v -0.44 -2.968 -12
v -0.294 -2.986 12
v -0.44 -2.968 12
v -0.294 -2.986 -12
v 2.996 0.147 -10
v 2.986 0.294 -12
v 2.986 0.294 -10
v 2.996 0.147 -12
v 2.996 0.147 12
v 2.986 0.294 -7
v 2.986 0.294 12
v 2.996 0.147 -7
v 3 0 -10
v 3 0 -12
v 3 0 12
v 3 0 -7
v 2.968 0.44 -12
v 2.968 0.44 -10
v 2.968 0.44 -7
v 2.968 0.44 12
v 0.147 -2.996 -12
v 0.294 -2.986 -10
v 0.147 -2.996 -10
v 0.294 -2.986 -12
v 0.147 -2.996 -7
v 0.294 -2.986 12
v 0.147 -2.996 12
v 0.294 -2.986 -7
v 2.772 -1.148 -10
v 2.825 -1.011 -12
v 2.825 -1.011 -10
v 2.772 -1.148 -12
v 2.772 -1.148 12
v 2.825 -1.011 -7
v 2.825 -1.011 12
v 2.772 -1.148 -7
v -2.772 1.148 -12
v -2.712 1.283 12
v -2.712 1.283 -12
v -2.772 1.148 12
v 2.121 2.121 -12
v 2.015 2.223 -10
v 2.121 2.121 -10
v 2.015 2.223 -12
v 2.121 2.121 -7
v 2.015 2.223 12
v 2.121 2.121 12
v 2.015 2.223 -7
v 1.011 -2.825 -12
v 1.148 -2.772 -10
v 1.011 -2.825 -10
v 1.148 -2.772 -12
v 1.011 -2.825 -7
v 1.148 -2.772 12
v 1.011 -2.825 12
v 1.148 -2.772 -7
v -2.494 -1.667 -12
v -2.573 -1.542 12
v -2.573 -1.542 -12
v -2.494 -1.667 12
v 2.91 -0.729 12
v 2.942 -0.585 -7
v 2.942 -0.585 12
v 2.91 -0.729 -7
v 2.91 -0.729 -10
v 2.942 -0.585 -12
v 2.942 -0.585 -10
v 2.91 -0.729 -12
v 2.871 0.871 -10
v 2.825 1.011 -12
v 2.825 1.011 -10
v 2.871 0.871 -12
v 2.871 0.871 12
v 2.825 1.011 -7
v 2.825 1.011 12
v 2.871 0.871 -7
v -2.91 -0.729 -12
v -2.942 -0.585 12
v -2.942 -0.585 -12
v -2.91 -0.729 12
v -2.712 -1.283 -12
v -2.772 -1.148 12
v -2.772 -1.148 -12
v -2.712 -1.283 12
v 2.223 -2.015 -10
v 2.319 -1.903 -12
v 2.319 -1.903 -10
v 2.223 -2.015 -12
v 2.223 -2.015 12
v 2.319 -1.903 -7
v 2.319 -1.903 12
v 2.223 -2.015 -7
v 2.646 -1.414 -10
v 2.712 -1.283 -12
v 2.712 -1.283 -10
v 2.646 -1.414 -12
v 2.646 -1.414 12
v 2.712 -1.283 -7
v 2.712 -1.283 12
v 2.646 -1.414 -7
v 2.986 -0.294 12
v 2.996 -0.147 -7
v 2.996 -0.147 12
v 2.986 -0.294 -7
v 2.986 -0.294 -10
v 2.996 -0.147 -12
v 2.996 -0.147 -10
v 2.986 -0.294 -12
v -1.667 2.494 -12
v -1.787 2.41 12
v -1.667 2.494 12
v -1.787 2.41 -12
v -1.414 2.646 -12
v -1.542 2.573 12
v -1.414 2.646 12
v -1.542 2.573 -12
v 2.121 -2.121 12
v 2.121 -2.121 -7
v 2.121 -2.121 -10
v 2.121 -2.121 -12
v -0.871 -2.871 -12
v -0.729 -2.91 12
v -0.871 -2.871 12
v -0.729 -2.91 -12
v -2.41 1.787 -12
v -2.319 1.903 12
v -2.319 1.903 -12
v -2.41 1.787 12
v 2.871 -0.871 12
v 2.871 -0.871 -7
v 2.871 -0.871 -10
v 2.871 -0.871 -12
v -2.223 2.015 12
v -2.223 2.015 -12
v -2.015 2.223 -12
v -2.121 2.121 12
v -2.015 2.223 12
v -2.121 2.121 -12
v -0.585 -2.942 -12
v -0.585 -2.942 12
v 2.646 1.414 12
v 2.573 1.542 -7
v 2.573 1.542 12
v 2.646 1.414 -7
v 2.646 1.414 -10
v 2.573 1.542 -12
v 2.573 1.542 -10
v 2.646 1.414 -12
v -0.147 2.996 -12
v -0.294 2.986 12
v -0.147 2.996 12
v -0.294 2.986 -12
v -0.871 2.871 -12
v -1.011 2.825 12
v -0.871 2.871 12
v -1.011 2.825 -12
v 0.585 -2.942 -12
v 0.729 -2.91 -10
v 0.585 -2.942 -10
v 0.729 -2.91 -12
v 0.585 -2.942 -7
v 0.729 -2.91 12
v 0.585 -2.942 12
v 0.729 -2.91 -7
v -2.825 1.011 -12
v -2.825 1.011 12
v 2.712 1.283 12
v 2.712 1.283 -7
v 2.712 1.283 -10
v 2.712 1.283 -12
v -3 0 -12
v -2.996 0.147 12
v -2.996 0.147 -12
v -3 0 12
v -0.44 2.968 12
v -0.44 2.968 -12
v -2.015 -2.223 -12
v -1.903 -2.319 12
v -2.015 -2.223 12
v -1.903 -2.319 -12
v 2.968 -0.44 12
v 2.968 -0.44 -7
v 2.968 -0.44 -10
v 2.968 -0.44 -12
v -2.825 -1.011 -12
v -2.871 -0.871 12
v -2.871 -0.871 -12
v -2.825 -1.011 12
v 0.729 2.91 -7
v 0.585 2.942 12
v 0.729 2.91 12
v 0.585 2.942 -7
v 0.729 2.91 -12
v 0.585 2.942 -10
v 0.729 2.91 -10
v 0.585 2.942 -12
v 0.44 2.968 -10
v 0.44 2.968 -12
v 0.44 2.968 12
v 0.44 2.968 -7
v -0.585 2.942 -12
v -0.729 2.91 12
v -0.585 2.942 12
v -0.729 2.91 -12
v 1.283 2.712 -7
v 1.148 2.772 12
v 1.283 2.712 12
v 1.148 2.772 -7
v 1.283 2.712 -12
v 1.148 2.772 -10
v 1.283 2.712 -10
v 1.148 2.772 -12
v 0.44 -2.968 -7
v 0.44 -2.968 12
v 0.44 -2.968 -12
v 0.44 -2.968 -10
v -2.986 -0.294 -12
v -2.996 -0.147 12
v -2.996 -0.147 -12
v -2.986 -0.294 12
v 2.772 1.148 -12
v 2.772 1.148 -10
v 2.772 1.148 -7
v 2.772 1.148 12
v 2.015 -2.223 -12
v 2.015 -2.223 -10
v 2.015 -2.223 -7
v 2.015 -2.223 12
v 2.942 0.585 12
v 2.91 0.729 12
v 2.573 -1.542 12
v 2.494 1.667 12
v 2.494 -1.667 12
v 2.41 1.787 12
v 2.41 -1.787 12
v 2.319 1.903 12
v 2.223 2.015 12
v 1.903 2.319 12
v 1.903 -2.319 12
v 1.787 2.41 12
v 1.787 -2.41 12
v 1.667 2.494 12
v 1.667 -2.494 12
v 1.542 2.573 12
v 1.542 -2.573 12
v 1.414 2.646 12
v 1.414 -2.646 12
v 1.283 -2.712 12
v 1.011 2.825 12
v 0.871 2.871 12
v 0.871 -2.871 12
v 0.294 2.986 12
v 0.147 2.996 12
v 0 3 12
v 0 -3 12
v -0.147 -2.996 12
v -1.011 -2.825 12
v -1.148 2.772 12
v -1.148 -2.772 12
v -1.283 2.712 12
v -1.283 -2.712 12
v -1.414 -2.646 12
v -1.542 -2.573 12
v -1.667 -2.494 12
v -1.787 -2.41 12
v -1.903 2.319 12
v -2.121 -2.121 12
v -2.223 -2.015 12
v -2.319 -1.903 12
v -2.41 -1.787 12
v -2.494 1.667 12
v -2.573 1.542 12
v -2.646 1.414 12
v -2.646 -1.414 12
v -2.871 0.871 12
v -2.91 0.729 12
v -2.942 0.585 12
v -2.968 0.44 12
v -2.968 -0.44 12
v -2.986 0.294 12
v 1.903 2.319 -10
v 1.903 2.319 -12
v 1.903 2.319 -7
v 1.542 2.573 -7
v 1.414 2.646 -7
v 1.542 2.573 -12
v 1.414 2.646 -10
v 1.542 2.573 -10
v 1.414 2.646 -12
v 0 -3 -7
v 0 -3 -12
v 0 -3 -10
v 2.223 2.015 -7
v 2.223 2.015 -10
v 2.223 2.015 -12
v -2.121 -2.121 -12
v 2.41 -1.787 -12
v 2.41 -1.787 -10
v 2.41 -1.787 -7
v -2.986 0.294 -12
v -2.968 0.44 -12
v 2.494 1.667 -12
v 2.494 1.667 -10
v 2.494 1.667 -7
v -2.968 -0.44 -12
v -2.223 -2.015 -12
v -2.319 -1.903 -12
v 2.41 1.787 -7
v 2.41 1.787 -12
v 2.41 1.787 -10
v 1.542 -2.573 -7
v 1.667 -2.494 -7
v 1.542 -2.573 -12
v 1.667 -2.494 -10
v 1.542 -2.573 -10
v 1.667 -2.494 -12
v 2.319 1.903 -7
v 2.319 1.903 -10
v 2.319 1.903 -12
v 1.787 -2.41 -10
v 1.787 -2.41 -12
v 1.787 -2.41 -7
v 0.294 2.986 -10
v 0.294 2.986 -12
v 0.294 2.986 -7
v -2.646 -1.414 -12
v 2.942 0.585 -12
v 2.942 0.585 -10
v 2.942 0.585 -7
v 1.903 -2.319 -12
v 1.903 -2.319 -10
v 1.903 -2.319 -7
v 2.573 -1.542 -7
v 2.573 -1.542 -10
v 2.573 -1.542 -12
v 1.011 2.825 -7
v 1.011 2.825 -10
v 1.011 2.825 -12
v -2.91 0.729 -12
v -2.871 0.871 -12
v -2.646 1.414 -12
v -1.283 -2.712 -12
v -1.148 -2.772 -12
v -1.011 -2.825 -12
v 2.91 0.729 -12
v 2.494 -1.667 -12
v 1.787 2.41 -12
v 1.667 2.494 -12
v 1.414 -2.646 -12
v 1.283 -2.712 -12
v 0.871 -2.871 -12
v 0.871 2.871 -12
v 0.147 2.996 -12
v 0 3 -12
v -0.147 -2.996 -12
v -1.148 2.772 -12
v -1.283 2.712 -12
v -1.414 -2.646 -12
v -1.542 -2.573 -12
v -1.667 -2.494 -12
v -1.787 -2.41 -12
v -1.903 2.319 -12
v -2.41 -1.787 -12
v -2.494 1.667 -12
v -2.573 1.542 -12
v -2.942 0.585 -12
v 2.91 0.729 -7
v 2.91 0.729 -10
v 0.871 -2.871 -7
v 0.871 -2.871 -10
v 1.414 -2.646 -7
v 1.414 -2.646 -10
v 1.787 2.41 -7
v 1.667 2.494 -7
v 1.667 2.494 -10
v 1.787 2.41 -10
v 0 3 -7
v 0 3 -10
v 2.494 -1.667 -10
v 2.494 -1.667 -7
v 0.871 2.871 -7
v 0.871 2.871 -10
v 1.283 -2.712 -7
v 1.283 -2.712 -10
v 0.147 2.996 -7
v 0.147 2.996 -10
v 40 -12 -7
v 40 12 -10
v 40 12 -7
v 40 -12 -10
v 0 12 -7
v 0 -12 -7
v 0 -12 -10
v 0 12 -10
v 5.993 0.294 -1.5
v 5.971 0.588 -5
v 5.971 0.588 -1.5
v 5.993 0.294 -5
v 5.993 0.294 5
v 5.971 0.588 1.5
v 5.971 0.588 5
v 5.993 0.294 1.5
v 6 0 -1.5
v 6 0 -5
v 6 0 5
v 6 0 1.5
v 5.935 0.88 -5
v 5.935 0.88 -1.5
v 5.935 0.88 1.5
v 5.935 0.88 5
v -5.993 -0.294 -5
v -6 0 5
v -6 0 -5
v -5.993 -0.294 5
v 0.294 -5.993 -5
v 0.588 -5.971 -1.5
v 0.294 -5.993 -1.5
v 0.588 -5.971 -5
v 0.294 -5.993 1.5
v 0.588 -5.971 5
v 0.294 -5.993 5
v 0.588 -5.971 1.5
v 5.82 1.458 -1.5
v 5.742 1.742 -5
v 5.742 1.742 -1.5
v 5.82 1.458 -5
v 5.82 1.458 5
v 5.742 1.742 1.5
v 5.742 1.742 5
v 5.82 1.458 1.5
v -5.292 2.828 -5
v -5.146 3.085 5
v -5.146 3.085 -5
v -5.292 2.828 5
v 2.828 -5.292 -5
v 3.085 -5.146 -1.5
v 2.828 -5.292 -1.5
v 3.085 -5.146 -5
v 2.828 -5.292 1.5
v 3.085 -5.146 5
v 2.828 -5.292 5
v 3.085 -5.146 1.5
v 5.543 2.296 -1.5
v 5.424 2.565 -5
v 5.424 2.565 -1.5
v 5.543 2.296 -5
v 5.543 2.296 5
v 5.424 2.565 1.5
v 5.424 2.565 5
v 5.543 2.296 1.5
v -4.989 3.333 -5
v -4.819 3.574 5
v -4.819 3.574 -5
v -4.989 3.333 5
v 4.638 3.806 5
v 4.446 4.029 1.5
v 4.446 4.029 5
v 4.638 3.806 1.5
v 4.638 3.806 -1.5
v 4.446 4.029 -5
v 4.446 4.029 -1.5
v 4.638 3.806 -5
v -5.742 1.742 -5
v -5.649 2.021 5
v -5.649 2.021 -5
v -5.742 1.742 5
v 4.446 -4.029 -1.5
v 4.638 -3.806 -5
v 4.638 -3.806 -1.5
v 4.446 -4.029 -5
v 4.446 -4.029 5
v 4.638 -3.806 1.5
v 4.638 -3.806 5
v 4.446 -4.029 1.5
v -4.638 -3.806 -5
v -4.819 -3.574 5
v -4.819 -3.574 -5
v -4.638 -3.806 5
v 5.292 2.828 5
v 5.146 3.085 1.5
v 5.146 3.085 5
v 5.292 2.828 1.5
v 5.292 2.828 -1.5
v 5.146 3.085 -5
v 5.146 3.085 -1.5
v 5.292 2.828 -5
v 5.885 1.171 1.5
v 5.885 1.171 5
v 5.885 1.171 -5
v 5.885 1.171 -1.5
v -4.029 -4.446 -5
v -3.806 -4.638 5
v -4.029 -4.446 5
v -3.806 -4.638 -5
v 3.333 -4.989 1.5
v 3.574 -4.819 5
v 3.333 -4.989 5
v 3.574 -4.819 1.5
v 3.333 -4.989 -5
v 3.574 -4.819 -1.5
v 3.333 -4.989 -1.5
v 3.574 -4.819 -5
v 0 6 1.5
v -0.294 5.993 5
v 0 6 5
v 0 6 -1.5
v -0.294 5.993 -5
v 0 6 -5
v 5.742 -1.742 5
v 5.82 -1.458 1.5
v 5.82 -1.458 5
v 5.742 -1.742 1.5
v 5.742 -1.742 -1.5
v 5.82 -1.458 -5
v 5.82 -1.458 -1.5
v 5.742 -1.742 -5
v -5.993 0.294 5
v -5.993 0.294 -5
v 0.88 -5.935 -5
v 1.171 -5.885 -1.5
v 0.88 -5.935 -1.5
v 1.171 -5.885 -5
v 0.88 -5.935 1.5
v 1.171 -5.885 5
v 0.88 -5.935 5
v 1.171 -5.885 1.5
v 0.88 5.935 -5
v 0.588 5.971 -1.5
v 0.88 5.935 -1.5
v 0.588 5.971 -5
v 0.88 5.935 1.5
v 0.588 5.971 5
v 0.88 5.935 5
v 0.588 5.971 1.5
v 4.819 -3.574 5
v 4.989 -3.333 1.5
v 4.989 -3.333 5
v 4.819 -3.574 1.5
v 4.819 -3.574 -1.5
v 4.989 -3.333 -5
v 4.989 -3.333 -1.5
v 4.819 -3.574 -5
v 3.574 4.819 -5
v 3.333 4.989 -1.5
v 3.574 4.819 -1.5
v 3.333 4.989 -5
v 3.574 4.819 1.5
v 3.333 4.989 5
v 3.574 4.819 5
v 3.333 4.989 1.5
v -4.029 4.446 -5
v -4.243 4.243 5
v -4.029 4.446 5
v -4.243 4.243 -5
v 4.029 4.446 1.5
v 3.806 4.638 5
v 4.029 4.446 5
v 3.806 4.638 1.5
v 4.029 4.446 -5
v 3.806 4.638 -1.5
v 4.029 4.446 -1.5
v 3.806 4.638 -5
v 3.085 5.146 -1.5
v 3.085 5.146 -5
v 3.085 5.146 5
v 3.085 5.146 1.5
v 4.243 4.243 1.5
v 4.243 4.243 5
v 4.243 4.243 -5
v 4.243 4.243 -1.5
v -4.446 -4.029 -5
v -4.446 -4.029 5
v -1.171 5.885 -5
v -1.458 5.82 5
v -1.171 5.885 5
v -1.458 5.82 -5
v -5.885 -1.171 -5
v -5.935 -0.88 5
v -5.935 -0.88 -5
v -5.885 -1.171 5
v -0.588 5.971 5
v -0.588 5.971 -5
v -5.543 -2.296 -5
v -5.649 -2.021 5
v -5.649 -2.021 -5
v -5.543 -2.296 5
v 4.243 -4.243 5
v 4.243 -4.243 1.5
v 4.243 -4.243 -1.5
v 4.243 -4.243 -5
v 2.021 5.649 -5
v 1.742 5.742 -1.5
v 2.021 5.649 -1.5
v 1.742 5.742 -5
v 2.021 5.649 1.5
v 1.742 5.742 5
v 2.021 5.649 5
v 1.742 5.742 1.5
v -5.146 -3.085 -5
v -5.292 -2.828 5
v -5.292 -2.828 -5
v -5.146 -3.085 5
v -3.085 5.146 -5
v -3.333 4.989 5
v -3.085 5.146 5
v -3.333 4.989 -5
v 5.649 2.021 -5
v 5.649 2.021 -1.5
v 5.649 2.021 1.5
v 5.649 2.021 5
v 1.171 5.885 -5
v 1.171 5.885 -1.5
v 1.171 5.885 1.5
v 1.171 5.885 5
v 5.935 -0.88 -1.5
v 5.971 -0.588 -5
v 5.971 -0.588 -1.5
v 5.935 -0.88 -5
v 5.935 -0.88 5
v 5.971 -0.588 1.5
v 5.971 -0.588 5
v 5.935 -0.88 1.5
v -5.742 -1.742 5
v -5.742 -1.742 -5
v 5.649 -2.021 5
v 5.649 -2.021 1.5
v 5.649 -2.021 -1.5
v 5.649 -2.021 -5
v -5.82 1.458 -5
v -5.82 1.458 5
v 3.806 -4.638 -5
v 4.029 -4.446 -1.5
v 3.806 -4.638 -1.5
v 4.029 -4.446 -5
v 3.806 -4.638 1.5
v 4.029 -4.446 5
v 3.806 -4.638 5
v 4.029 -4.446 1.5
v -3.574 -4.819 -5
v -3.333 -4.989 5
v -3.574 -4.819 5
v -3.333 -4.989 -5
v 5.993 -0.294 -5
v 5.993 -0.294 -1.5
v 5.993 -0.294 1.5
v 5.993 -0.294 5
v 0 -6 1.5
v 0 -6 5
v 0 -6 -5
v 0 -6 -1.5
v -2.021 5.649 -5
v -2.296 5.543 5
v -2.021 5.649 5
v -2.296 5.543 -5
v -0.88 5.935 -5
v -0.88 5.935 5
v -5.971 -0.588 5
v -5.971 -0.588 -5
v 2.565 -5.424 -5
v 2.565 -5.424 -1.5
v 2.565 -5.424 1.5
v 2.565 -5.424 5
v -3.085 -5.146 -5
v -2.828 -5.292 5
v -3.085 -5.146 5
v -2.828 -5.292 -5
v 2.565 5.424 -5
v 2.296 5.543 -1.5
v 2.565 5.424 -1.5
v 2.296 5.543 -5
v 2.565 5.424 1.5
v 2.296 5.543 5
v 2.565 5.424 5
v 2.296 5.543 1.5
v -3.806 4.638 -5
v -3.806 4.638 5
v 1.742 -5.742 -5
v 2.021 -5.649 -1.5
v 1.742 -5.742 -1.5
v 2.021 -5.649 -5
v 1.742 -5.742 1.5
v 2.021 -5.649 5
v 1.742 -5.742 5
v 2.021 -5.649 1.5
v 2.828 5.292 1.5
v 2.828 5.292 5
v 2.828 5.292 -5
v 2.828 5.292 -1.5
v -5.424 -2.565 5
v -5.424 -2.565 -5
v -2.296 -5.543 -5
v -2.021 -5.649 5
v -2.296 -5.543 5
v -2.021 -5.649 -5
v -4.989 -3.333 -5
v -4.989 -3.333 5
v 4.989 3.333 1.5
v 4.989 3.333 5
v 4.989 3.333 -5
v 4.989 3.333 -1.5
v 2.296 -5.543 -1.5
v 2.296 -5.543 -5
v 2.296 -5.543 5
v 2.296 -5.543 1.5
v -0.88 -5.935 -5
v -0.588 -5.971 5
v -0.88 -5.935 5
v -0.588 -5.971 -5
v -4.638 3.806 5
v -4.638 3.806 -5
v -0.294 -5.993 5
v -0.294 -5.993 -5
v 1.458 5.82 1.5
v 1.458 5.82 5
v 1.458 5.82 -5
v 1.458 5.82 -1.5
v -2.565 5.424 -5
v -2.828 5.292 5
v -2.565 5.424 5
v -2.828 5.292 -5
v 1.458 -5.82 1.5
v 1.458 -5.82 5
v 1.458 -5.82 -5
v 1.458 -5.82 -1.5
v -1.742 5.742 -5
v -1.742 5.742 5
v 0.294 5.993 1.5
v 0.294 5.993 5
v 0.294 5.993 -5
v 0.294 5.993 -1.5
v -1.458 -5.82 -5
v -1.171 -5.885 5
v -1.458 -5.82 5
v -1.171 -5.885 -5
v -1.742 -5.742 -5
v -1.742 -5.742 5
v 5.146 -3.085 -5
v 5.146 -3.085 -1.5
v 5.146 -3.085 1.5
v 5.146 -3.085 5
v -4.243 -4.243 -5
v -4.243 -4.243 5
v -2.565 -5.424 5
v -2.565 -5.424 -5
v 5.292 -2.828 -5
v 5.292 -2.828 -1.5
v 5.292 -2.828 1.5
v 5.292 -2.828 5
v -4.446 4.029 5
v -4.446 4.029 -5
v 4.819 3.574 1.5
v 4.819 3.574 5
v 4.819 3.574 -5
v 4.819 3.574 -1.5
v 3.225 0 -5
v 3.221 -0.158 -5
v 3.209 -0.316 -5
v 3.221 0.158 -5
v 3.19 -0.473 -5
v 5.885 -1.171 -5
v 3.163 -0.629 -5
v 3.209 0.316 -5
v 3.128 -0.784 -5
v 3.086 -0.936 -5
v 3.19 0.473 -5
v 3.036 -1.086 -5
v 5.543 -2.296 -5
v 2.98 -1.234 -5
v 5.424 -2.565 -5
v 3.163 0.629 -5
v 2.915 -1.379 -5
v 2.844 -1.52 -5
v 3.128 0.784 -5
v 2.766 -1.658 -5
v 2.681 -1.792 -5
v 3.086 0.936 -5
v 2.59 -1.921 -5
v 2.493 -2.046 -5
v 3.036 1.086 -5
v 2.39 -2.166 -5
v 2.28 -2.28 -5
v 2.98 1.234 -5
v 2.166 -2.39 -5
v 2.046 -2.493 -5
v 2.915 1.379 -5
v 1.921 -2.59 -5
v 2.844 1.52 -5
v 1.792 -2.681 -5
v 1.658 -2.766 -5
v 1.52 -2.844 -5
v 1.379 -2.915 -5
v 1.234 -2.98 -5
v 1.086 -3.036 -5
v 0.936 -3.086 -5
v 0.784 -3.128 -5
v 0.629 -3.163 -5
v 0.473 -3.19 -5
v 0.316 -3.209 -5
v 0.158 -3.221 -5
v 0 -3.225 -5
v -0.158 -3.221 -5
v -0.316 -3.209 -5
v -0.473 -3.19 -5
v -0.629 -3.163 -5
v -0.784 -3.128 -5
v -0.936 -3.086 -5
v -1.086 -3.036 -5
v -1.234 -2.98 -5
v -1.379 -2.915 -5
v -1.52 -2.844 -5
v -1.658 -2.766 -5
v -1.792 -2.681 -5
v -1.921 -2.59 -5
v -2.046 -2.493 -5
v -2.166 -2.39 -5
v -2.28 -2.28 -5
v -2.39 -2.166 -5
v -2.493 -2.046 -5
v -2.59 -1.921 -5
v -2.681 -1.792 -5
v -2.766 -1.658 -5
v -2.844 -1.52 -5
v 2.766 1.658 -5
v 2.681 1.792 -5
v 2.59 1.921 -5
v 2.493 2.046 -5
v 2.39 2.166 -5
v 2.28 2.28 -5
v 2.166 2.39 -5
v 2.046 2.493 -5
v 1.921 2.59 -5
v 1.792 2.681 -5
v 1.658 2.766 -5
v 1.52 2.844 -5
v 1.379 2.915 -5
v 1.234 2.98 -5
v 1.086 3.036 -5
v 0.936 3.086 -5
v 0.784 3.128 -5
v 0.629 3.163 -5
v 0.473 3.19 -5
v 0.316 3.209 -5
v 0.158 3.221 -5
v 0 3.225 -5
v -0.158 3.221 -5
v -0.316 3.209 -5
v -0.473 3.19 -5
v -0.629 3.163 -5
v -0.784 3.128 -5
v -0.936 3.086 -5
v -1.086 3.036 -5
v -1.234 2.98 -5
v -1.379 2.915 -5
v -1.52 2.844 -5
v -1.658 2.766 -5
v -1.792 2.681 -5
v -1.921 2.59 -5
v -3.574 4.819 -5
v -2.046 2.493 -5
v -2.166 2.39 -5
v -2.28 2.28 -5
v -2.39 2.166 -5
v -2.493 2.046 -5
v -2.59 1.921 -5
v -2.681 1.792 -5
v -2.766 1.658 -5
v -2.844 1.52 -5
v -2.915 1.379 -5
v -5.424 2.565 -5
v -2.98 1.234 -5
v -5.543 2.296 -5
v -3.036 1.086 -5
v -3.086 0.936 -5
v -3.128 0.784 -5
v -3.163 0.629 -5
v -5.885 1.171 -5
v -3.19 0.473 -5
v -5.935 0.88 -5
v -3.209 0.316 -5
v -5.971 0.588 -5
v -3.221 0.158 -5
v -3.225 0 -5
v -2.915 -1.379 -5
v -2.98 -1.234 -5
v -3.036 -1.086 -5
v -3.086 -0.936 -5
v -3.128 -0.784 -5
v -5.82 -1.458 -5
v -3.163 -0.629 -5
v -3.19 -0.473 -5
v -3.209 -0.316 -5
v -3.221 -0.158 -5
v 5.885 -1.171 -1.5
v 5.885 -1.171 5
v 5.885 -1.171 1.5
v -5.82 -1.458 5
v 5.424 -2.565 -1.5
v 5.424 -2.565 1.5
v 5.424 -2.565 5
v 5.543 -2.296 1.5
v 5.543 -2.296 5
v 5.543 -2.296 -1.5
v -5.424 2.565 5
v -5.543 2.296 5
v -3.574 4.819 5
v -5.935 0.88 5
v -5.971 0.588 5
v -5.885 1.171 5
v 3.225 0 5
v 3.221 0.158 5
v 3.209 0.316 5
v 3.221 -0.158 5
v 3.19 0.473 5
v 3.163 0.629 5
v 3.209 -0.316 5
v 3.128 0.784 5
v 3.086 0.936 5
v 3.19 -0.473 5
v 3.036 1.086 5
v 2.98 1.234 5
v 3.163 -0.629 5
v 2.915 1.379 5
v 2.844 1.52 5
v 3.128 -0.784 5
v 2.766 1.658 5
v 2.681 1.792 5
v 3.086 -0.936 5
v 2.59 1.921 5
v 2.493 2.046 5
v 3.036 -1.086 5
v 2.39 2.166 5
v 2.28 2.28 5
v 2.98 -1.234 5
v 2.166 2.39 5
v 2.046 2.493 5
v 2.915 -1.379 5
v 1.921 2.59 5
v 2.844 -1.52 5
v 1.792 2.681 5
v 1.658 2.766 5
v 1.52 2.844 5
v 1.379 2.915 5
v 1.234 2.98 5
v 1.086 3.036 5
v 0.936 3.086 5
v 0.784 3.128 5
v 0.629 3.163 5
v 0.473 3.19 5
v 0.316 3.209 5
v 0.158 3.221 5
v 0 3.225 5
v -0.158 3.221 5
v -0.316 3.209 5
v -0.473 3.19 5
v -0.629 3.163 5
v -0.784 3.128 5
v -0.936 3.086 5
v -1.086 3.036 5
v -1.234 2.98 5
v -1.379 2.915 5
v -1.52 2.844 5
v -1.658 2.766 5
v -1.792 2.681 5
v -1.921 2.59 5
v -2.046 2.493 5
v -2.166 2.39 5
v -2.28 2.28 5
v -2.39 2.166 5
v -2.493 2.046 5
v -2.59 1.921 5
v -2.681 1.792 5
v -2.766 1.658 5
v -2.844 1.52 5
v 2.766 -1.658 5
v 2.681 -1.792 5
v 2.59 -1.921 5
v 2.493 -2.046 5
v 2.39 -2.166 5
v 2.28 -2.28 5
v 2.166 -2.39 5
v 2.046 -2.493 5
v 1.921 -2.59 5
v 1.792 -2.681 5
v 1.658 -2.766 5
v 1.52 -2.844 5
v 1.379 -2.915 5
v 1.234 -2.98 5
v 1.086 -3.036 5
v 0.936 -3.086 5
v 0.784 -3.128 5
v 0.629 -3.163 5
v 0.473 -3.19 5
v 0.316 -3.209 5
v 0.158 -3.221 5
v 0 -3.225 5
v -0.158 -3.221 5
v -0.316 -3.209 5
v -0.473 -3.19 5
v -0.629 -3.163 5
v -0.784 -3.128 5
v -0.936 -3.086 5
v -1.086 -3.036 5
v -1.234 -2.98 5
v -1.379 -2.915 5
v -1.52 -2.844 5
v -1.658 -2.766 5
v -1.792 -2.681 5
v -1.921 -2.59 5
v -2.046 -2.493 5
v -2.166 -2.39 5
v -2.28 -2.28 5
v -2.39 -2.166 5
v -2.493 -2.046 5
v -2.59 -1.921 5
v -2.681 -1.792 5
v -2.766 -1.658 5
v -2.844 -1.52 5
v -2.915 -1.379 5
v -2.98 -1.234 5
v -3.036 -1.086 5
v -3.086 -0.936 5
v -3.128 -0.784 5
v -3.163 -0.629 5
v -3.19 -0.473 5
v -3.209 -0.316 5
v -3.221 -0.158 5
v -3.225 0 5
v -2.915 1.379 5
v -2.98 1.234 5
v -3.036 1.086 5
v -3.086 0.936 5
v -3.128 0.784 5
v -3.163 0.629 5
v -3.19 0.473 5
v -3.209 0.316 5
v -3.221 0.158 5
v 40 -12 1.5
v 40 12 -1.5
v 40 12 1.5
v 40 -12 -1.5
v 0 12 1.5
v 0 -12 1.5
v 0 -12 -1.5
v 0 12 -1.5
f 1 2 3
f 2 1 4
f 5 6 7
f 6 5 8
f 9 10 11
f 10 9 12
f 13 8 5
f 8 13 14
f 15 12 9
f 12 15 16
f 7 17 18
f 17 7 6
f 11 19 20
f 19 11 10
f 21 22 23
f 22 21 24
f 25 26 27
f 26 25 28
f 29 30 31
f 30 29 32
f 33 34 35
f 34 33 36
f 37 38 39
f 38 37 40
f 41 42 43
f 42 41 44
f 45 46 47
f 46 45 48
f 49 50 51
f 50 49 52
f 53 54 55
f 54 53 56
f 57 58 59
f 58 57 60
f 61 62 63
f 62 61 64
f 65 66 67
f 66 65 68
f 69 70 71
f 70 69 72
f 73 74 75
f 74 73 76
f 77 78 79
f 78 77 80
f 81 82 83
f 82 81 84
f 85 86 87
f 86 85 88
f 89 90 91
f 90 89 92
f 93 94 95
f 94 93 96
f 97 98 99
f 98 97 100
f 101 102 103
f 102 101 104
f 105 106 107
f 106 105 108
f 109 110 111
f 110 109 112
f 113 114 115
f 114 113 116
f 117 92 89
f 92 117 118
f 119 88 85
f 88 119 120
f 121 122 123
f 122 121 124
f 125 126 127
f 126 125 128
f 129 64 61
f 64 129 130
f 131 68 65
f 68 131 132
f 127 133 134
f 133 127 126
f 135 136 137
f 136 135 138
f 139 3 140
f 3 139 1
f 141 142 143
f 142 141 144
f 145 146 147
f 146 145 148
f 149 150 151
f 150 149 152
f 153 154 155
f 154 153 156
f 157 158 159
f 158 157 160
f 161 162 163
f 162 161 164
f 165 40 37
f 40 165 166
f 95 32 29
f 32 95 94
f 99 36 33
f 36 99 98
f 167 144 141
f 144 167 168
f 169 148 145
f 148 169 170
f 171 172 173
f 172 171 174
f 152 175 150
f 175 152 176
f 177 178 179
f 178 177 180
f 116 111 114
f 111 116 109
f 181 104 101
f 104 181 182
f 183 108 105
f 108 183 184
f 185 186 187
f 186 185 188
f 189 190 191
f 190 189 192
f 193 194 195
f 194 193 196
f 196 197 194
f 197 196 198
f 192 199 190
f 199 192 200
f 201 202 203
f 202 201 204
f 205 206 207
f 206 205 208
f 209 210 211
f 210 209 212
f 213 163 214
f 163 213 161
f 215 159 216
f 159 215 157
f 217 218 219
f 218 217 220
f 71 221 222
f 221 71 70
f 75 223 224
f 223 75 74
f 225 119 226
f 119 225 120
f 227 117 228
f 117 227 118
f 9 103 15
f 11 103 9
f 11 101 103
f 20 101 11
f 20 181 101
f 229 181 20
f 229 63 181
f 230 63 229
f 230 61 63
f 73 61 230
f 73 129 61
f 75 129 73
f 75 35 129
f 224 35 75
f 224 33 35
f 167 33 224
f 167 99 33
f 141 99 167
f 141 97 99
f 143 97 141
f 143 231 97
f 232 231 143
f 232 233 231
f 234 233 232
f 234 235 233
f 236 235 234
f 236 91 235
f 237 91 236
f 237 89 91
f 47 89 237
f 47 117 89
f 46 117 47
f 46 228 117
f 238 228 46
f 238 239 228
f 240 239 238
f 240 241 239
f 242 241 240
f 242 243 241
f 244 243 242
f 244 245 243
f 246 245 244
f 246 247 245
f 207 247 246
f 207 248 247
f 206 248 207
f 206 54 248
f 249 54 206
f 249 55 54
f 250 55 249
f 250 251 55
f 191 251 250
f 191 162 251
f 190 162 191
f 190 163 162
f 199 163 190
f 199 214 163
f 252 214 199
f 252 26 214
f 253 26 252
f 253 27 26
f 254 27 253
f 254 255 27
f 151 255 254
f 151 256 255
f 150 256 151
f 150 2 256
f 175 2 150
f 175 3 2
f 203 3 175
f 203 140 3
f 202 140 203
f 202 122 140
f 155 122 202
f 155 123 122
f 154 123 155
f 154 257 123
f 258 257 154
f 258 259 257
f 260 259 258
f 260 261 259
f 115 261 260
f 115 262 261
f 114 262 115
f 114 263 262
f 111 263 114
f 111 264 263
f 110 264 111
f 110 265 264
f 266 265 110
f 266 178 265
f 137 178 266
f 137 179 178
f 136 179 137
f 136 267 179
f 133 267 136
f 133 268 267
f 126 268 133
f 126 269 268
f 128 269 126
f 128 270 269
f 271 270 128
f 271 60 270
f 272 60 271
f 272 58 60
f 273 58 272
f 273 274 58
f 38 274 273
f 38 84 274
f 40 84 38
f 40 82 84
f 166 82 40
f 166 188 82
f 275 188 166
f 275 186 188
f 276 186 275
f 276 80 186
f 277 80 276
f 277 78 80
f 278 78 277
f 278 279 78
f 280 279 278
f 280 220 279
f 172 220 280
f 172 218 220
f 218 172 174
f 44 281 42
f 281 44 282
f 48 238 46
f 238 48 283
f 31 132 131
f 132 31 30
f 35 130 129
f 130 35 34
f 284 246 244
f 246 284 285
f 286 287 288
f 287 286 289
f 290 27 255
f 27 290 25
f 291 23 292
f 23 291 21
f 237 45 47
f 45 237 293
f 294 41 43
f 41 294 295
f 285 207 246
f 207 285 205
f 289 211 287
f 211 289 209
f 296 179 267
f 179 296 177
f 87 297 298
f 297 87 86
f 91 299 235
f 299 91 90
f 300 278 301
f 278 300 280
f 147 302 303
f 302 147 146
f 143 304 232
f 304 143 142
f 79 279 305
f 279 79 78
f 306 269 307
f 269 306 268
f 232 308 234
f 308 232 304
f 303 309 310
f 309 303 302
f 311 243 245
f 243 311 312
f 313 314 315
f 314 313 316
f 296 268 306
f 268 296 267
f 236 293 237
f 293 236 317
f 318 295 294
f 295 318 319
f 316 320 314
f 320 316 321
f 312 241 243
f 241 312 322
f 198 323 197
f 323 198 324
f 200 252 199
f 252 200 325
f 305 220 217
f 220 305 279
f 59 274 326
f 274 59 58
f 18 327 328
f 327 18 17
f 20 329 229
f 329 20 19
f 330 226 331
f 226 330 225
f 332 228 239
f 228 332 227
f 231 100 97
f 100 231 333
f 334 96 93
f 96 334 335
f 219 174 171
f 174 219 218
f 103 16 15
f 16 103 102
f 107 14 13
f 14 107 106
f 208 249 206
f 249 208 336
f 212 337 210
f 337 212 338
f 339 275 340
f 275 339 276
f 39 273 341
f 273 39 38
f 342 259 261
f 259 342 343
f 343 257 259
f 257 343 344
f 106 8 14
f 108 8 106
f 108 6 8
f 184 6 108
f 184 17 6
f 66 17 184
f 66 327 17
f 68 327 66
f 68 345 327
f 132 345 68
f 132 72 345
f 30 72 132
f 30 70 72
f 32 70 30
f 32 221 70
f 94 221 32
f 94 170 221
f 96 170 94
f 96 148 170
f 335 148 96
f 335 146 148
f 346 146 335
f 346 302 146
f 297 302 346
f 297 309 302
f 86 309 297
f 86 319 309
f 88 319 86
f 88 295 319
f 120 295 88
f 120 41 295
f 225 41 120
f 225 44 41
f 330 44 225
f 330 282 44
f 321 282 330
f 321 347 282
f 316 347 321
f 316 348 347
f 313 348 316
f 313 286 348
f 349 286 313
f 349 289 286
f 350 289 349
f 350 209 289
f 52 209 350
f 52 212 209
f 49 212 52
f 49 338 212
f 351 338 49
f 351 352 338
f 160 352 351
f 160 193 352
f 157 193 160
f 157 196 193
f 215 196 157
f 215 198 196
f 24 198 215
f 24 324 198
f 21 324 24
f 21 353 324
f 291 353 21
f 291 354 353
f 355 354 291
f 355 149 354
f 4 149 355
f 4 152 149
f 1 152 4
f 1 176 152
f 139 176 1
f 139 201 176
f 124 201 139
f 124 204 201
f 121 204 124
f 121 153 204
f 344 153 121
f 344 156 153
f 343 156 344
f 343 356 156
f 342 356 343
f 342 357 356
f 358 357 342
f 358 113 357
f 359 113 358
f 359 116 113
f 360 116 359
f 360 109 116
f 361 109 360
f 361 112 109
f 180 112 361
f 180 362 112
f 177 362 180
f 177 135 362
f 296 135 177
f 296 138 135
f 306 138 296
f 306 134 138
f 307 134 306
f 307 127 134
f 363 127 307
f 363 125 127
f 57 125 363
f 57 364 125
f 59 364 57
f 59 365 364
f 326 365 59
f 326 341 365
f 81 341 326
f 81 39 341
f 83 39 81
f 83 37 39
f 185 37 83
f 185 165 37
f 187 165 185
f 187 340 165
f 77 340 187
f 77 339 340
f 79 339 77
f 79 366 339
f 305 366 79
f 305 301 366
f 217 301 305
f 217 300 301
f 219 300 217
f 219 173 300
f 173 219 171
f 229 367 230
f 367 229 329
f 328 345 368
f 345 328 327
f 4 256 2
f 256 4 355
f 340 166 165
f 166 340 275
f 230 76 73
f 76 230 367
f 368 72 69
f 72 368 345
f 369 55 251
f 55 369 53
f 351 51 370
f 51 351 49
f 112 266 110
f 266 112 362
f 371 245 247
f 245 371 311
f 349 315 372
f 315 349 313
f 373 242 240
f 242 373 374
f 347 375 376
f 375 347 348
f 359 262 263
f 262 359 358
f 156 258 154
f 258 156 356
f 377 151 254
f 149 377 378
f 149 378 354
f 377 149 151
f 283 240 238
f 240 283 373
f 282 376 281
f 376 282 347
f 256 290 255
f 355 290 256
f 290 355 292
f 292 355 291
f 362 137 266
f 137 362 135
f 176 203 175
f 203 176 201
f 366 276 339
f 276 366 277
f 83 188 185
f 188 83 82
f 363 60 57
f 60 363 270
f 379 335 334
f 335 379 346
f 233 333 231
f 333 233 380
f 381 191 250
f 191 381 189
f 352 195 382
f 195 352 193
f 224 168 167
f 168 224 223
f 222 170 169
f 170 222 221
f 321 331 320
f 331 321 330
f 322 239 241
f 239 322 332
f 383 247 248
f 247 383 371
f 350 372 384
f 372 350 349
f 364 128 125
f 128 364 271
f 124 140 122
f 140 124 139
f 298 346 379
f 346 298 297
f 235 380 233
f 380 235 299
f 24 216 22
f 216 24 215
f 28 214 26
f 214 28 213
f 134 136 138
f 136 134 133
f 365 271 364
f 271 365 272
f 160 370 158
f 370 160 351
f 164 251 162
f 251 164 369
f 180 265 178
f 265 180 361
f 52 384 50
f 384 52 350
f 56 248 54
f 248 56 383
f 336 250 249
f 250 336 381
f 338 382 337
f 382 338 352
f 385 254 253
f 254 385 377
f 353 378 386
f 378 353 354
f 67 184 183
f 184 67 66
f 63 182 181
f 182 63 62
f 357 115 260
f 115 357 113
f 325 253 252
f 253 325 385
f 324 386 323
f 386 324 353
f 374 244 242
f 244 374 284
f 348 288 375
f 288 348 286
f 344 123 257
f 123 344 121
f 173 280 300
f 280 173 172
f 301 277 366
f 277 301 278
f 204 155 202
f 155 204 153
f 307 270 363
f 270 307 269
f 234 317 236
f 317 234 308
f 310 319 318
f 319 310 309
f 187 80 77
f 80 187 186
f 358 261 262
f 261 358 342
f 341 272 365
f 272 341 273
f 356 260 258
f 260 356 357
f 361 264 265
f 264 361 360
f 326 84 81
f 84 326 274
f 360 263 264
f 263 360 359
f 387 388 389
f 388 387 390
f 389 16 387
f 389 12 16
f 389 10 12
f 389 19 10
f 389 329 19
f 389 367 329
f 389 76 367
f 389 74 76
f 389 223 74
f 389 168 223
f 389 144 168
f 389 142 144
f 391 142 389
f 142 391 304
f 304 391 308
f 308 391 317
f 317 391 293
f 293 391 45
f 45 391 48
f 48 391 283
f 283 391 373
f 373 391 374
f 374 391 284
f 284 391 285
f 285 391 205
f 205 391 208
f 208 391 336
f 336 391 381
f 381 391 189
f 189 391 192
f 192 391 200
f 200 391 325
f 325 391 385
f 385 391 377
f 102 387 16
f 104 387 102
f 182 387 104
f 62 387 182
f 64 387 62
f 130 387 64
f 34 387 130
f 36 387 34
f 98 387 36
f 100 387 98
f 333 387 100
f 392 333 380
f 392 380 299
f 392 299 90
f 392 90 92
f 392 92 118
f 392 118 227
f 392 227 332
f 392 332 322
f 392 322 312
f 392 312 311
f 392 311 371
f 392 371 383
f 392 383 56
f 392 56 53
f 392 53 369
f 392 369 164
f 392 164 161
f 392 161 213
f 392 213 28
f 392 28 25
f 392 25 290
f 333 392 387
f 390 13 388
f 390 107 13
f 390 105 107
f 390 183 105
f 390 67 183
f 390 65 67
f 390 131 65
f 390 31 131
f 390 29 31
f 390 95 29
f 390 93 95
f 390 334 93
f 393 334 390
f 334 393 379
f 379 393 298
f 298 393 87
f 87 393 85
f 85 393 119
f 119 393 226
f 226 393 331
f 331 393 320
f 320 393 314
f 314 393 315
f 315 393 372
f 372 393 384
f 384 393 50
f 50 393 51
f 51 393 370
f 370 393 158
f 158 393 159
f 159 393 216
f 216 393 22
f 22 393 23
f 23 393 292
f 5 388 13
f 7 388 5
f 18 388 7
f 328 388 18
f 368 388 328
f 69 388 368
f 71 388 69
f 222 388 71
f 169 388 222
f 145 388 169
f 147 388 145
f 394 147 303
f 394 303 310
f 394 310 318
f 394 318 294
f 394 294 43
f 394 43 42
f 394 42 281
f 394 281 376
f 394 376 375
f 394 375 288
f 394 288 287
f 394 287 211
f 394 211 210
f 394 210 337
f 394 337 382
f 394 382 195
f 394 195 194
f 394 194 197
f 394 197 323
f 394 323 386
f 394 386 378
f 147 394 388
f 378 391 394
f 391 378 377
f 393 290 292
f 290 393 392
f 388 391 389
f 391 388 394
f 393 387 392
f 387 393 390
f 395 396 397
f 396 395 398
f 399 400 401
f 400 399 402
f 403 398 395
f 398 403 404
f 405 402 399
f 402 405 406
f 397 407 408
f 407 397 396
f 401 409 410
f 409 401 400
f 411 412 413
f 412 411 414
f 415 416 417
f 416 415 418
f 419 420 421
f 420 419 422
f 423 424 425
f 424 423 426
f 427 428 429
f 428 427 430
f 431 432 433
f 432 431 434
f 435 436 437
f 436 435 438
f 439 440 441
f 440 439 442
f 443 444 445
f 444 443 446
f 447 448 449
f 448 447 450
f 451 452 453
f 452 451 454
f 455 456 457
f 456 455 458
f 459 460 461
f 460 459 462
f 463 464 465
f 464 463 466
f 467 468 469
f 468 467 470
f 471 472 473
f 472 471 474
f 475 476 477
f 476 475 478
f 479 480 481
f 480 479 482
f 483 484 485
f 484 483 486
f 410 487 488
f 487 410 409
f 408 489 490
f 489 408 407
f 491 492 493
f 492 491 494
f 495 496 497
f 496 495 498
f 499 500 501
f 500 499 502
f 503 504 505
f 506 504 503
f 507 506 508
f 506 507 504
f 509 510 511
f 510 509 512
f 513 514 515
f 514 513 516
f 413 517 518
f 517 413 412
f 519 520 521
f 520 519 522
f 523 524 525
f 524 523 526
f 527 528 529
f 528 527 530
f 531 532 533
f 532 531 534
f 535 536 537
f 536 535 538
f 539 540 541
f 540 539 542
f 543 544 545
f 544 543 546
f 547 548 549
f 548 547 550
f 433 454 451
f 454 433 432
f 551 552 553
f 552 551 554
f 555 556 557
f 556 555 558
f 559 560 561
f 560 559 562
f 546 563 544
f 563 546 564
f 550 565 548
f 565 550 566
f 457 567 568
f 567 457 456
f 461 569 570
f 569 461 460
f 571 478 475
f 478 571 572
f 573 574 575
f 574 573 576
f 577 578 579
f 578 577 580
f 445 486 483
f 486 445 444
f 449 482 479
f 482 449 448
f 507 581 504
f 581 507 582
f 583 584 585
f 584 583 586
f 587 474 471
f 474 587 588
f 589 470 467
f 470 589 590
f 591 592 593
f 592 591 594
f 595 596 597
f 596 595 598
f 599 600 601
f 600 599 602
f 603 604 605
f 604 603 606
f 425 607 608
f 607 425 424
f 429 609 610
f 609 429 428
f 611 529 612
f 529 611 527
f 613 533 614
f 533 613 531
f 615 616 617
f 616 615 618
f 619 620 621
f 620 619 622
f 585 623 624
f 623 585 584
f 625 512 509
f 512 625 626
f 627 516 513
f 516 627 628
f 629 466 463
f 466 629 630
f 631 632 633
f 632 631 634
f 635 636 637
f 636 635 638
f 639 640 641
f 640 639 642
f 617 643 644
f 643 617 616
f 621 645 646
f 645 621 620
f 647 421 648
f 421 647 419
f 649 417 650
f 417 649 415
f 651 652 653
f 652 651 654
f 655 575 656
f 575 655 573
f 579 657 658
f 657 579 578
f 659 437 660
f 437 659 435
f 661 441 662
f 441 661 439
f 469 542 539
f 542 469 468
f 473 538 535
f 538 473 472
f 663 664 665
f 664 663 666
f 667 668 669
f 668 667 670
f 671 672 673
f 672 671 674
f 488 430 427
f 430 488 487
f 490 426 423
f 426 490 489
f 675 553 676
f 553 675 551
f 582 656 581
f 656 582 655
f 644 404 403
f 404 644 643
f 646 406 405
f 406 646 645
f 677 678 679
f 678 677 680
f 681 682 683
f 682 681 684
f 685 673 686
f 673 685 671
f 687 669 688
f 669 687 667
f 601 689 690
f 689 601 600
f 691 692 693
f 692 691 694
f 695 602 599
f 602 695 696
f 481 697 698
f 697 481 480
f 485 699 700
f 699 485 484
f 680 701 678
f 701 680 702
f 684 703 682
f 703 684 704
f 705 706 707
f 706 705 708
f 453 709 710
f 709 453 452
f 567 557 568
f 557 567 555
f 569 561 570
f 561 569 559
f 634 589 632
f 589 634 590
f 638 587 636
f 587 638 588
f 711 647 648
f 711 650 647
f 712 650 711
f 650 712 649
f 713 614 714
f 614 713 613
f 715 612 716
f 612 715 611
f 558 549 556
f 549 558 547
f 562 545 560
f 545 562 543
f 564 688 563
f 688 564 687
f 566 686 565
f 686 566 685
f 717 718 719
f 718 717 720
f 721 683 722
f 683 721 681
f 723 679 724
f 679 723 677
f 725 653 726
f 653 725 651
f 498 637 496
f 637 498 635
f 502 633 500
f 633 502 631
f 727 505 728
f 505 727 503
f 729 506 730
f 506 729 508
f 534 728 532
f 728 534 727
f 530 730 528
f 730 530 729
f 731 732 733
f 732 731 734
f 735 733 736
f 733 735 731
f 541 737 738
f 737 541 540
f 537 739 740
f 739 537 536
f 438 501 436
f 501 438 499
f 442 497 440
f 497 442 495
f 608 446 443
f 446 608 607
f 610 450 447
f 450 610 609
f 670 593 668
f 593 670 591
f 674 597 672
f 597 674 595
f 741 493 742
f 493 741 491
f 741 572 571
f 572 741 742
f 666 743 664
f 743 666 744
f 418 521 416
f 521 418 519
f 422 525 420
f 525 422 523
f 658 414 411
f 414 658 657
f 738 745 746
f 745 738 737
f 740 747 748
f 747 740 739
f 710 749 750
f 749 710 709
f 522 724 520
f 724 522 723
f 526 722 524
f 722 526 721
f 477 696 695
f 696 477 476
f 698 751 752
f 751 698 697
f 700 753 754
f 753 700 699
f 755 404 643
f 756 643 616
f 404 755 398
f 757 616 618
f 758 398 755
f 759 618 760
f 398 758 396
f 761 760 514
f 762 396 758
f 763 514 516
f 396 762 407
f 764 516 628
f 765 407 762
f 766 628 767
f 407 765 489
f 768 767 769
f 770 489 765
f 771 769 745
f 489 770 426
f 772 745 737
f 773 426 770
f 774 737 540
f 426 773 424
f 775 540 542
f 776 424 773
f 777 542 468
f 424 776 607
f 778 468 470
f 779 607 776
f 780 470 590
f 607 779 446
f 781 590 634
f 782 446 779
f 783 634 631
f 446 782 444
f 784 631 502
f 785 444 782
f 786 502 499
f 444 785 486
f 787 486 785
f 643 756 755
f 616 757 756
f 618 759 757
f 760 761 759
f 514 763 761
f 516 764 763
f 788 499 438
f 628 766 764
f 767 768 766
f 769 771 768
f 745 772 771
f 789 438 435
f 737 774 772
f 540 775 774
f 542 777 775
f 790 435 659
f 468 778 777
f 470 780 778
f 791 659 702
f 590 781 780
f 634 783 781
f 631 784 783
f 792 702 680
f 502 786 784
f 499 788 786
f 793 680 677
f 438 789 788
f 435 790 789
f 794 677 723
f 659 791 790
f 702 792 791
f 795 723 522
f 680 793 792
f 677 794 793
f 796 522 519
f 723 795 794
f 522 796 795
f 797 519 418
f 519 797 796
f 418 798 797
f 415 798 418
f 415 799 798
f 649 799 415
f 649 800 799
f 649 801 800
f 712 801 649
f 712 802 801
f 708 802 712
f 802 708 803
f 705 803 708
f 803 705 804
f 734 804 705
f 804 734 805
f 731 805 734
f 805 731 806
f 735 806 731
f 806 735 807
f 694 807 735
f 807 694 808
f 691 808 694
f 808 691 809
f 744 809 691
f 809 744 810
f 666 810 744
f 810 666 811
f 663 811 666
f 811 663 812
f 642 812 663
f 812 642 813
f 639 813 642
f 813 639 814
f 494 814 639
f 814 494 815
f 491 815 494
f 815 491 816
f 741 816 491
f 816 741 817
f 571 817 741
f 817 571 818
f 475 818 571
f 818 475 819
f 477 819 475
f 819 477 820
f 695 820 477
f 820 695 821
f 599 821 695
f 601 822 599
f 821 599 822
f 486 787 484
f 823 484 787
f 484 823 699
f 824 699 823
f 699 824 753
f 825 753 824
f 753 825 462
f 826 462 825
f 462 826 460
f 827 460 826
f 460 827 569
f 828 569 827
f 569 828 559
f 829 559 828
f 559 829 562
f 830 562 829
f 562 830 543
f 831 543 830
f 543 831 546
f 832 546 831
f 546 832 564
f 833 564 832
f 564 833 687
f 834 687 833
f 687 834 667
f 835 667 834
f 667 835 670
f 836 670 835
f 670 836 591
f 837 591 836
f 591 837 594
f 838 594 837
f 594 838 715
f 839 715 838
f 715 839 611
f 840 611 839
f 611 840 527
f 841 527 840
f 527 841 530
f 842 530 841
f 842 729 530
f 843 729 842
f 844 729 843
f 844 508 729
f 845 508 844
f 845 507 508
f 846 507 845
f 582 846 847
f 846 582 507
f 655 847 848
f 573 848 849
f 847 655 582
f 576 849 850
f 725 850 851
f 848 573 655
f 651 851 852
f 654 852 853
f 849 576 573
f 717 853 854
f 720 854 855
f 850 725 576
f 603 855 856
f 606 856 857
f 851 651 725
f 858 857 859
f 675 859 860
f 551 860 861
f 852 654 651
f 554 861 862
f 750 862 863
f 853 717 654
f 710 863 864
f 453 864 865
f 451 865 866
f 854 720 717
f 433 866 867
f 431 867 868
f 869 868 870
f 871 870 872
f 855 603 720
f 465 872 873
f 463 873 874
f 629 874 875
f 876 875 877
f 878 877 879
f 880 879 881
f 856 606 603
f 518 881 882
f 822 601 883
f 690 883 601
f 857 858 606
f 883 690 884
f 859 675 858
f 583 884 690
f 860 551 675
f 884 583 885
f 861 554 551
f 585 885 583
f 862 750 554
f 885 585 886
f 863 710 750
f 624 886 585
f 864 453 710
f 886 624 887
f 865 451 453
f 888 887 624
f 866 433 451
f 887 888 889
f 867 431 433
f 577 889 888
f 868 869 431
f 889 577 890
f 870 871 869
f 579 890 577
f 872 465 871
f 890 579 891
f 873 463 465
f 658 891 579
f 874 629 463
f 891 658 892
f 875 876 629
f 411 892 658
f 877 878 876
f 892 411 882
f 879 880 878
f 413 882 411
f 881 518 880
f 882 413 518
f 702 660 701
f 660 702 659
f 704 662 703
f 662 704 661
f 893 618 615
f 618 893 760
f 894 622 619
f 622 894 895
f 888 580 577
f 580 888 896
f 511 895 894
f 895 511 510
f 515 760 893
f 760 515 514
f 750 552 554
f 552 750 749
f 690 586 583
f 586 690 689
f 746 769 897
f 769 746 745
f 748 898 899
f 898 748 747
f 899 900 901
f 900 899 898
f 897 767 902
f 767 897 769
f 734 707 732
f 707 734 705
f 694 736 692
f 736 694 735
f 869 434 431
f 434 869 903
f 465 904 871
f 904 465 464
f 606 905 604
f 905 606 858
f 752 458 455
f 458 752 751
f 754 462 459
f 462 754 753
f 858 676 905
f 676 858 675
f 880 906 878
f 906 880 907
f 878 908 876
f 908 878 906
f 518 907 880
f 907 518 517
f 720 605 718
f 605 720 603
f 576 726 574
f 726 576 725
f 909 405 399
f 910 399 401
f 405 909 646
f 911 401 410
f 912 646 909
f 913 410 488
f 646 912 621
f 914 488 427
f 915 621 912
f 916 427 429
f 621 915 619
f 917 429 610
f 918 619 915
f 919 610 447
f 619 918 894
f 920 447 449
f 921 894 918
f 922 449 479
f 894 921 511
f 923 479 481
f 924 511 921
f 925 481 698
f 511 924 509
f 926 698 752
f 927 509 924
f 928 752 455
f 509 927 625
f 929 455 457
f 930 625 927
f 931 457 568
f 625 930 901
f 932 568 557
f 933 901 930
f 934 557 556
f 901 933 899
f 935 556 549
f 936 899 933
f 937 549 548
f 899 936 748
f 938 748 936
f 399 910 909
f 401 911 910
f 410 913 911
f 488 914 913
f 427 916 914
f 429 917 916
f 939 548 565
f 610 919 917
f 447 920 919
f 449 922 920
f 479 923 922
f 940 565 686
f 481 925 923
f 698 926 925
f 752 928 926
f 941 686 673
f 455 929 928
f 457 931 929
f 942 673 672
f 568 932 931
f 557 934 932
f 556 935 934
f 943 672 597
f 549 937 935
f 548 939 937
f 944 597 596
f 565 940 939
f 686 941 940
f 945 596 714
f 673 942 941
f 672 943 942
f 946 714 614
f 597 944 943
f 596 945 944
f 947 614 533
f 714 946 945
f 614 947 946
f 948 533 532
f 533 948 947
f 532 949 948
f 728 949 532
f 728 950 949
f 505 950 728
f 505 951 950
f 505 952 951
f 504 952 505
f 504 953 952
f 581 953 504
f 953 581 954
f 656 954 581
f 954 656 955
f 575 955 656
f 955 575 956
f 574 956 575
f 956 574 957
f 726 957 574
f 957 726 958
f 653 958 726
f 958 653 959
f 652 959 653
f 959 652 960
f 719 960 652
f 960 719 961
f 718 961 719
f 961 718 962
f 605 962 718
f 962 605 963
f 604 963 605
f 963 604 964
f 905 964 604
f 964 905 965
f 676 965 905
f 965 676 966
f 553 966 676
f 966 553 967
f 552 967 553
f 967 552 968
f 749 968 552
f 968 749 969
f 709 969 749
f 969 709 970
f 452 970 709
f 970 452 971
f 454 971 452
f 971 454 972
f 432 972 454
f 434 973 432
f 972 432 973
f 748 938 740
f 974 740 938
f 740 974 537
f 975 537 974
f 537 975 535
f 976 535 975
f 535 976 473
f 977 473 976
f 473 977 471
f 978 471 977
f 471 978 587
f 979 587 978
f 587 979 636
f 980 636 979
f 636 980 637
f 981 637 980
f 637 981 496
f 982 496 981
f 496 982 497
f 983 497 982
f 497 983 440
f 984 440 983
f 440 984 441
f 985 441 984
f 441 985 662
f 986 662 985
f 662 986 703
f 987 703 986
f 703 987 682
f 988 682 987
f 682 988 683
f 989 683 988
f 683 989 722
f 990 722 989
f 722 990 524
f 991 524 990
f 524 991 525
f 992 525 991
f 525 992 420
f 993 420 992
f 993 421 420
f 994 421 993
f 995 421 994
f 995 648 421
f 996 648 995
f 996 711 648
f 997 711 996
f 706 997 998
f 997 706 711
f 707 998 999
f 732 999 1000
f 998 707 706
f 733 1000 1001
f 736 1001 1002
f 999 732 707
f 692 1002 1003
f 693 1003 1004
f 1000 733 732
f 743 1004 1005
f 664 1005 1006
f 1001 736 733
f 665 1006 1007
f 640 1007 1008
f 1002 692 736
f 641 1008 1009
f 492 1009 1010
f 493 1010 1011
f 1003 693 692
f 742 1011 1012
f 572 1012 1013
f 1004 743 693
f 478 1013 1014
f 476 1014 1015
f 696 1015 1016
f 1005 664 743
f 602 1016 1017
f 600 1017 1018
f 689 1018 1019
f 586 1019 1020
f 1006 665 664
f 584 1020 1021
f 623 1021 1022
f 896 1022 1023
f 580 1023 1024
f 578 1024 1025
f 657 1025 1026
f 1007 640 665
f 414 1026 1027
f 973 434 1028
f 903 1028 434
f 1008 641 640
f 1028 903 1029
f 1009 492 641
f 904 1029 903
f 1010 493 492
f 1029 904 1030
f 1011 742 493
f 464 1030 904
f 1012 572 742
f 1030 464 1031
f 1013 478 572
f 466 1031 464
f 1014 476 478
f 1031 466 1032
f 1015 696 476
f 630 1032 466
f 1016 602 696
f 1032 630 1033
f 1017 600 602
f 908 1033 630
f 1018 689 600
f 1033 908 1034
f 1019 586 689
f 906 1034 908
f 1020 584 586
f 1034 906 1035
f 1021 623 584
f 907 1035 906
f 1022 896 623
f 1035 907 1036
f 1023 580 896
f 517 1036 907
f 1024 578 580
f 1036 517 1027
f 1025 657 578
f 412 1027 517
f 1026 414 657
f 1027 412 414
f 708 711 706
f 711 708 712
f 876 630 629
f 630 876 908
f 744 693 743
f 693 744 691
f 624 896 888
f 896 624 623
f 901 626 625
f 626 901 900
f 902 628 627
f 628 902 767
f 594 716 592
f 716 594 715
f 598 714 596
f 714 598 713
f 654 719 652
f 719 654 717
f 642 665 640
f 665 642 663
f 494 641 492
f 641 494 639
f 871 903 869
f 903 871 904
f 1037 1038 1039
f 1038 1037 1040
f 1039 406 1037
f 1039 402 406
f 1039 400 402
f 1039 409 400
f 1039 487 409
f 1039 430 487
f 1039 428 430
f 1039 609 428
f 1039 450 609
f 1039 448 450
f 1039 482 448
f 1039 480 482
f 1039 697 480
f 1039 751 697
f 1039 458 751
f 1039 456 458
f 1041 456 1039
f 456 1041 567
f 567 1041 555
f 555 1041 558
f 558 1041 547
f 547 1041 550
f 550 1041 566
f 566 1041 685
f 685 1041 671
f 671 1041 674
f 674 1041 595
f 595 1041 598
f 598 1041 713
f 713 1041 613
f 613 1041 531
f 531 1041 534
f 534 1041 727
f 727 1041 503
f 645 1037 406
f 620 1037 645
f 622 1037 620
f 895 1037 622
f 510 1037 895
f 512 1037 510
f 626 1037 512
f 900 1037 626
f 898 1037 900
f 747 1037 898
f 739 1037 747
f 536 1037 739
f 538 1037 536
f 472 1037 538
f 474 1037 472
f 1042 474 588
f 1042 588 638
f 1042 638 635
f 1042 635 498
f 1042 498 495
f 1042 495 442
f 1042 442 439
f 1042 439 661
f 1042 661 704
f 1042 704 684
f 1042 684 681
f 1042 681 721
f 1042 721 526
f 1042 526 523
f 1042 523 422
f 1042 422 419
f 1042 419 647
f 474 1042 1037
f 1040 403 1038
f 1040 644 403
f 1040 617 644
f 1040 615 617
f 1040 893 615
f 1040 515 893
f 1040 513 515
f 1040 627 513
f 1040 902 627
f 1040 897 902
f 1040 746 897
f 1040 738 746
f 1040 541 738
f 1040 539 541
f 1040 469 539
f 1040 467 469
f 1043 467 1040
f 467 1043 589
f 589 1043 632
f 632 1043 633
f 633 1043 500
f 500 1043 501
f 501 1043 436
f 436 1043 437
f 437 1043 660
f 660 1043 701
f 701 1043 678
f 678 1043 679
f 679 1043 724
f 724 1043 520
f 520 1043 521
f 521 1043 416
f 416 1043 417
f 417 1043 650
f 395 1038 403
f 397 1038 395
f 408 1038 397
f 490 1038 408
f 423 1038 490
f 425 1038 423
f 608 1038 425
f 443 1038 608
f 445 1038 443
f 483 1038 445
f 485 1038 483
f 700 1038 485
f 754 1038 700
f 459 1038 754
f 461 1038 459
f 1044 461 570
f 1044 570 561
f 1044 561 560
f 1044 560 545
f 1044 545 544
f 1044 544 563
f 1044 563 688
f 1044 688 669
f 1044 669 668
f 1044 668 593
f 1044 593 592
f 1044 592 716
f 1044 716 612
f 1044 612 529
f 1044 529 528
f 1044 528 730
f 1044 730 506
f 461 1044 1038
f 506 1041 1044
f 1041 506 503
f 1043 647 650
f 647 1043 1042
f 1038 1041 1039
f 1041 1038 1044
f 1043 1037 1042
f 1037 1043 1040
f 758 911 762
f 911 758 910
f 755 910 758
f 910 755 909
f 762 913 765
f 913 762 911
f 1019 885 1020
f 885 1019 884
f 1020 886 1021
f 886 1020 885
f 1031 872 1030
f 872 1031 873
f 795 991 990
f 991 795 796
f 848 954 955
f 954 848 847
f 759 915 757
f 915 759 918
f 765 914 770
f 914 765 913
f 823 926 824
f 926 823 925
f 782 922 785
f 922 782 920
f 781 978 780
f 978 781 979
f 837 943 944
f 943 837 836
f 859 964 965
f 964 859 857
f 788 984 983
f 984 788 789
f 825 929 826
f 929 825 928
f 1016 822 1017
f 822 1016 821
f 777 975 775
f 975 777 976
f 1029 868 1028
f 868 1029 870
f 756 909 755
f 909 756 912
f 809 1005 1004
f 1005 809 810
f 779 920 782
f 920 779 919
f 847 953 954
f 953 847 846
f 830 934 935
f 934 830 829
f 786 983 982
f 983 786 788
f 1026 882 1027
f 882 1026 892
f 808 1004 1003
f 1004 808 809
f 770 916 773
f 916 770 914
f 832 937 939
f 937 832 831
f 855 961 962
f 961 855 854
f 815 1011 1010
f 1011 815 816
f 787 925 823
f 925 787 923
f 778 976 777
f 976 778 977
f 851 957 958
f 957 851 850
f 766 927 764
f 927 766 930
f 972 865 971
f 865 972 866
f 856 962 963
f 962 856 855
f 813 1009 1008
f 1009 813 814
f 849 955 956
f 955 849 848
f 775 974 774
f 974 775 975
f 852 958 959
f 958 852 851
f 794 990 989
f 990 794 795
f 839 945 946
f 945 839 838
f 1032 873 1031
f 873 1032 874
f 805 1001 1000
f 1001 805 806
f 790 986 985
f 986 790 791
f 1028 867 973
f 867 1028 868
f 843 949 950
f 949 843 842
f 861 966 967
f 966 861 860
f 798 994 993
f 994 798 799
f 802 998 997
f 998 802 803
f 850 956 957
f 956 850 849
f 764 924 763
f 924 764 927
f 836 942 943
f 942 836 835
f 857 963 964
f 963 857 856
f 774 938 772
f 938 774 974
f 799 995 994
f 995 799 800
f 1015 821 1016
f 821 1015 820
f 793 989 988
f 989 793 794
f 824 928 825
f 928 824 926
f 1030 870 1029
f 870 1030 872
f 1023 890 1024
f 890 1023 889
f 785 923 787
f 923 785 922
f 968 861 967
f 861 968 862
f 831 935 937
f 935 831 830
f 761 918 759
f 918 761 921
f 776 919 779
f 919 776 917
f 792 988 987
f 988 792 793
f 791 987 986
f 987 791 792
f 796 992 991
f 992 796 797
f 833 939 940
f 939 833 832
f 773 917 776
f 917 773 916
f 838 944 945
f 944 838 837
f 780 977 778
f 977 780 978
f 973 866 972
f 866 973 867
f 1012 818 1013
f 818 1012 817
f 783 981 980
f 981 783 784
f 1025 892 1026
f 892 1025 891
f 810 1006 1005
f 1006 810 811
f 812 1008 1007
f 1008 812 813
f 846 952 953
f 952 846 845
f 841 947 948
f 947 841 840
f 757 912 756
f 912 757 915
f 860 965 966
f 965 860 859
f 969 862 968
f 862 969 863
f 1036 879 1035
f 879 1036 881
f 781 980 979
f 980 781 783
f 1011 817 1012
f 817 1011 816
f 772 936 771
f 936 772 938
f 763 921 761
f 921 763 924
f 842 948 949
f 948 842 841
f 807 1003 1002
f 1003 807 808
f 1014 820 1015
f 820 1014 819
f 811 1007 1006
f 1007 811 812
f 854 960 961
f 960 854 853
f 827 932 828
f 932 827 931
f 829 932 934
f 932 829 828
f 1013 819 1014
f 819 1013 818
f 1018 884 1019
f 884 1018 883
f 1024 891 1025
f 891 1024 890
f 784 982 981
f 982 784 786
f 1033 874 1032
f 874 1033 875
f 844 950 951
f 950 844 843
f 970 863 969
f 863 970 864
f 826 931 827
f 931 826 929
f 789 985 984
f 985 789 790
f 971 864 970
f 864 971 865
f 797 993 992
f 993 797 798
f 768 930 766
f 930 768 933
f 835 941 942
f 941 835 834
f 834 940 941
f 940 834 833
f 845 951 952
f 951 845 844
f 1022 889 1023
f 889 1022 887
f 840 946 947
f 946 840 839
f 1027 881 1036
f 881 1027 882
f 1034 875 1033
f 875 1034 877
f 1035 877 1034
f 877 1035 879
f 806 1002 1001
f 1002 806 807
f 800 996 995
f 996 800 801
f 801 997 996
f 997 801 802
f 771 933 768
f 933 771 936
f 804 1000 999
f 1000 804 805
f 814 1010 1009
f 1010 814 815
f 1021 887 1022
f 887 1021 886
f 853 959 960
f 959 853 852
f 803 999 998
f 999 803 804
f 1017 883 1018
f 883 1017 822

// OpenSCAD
$fn = 128;

agentscad_part = "all";
hinge_angle = 0;

pin_d = 6;
clearance = 0.45;
hole_d = pin_d + clearance;

sleeve_od = 12;
sleeve_h = 10;
pin_h = 24;

module fixed_part() {
    union() {
        cylinder(d = pin_d, h = pin_h, center = true);
        translate([20, 0, -8.5])
            cube([40, 24, 3], center = true);
    }
}

module moving_part() {
    difference() {
        union() {
            cylinder(d = sleeve_od, h = sleeve_h, center = true);
            translate([20, 0, 0])
                cube([40, 24, 3], center = true);
        }
        cylinder(d = hole_d, h = sleeve_h + 4, center = true);
    }
}

if (agentscad_part == "all" || agentscad_part == "fixed") {
    fixed_part();
}

if (agentscad_part == "all" || agentscad_part == "moving") {
    rotate([0, 0, hinge_angle])
        moving_part();
}
